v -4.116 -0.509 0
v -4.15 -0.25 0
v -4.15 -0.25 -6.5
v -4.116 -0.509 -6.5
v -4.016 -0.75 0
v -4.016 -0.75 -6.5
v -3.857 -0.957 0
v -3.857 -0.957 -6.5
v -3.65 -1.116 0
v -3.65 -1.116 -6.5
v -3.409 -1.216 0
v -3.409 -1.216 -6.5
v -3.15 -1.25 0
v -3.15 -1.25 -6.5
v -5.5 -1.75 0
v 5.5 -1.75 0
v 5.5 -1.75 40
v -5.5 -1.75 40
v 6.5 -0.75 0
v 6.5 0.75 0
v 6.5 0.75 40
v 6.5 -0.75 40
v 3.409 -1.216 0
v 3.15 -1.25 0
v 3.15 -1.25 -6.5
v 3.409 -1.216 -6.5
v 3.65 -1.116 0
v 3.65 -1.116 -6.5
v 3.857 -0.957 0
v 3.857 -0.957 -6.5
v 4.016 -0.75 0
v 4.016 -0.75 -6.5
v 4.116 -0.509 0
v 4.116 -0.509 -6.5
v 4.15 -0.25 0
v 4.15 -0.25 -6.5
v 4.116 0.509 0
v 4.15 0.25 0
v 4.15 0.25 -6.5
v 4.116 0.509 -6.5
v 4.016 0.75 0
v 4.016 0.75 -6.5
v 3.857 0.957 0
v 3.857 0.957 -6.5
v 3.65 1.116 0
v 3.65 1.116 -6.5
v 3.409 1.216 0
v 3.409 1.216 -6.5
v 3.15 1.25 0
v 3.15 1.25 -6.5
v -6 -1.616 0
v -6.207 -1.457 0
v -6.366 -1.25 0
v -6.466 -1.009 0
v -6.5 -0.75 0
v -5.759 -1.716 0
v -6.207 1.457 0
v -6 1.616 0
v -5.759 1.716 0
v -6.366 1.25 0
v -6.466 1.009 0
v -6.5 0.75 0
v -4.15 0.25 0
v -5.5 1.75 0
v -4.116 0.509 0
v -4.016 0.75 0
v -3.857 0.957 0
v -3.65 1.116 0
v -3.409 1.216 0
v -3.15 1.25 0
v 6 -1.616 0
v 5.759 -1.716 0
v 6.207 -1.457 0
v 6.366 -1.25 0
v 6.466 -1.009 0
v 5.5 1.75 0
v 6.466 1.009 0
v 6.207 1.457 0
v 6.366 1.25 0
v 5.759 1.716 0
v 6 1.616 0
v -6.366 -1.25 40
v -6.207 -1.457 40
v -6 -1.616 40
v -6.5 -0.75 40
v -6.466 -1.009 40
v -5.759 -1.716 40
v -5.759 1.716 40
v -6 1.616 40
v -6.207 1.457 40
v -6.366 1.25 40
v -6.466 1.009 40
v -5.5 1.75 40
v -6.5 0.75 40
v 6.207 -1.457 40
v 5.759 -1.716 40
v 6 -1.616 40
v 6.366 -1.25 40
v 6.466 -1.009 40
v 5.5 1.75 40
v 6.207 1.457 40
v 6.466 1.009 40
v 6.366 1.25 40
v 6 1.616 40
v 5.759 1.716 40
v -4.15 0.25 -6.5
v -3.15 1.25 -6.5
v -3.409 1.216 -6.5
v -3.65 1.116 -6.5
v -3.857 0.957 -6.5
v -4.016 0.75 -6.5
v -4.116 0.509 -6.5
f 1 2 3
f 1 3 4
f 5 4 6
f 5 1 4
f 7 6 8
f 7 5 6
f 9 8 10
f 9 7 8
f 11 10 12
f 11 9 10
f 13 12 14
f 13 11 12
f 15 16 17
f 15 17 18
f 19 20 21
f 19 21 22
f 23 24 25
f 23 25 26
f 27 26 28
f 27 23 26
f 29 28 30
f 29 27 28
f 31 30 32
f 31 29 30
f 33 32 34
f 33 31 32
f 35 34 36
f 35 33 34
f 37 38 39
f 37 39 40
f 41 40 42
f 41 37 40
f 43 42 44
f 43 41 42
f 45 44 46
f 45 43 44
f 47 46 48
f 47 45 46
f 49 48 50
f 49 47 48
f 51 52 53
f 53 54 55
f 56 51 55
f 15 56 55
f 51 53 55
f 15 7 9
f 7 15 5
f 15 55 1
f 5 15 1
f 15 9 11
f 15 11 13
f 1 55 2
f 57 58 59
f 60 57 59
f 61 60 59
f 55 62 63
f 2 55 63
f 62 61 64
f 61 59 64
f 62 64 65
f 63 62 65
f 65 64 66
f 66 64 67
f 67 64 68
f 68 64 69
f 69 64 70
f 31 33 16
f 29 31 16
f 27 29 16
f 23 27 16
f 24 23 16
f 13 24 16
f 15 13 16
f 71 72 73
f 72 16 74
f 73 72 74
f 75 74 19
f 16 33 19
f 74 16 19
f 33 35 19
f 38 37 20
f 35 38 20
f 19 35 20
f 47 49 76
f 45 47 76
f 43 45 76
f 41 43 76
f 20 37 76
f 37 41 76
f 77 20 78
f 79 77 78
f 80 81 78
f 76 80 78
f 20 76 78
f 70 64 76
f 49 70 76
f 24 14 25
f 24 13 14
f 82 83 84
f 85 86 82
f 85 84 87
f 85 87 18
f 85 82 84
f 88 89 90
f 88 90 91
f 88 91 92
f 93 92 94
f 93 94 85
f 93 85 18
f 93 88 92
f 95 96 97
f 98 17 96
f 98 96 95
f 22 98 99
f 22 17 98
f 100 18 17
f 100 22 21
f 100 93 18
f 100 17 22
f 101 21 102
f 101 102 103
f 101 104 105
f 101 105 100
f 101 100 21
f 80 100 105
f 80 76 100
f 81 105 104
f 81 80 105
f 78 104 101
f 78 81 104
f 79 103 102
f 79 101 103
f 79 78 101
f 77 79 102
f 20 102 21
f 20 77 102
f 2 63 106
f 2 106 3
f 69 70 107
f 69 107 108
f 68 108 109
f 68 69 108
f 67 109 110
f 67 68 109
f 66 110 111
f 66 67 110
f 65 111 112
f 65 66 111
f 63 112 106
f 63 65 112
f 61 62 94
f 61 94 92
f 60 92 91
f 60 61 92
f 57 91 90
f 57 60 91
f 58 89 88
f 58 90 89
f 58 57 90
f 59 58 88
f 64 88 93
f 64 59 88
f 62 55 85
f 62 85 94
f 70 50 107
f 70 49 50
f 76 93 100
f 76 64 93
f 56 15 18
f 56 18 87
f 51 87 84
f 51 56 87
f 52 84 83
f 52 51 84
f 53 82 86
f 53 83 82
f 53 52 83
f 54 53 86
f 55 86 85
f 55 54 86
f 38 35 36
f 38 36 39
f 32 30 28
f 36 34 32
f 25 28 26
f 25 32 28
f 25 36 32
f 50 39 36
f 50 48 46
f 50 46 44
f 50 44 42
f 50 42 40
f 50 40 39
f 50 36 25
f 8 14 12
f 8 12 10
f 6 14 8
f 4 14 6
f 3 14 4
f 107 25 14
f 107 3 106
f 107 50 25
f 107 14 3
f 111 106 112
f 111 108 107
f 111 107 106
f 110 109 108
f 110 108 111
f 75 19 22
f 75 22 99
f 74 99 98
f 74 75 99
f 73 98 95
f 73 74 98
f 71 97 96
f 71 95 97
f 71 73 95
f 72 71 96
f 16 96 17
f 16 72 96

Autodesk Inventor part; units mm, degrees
ref_plane "YZ Plane" through (0, 0, 0) normal (1, 0, 0) x (0, 1, 0)
ref_plane "XZ Plane" through (0, 0, 0) normal (0, 1, 0) x (-1, 0, 0)
ref_plane "XY Plane" through (0, 0, 0) normal (0, 0, 1) x (1, 0, 0)
sketch "Sketch1" plane through (0, 0, 0) normal (0, 0, 1) x (1, 0, 0)
  line L0 (-5.5, 1.75) -> (5.5, 1.75)
  line L1 (6.5, 0.75) -> (6.5, -0.75)
  line L2 (5.5, -1.75) -> (-5.5, -1.75)
  line L3 (-6.5, -0.75) -> (-6.5, 0.75)
  line L4 (0, 0) -> (0, 3.6789) construction
  line L5 (0, 0) -> (3.0794, 0) construction
  arc A0 (-5.5, 1.75) -> (-6.5, 0.75) centre (-5.5, 0.75) ccw
  arc A1 (-6.5, -0.75) -> (-5.5, -1.75) centre (-5.5, -0.75) ccw
  arc A2 (5.5, -1.75) -> (6.5, -0.75) centre (5.5, -0.75) ccw
  arc A3 (6.5, 0.75) -> (5.5, 1.75) centre (5.5, 0.75) ccw
  point P0 (-6.5, 1.75)
  point P1 (6.5, -1.75)
  point P2 (6.5, 1.75)
  dimension "d0" = 13
  dimension "d1" = 3.5
  dimension "d2" = 1
  dimension "d3" = 1
extrude "Extrusion1" add sketch "Sketch1" along normal blind 40
sketch "Sketch2" plane through (0, 0, 0) normal (0, 0, -1) x (-1, 0, 0)
  line L0 (-3.15, 1.25) -> (3.15, 1.25)
  line L1 (4.15, 0.25) -> (4.15, -0.25)
  line L2 (3.15, -1.25) -> (-3.15, -1.25)
  line L3 (-4.15, -0.25) -> (-4.15, 0.25)
  line L4 (0, 0) -> (0, 2.3167) construction
  line L5 (0, 0) -> (2.0938, 0) construction
  arc A0 (-3.15, 1.25) -> (-4.15, 0.25) centre (-3.15, 0.25) ccw
  arc A1 (-4.15, -0.25) -> (-3.15, -1.25) centre (-3.15, -0.25) ccw
  arc A2 (3.15, -1.25) -> (4.15, -0.25) centre (3.15, -0.25) ccw
  arc A3 (4.15, 0.25) -> (3.15, 1.25) centre (3.15, 0.25) ccw
  point P0 (4.15, -1.25)
  point P1 (4.15, 1.25)
  point P2 (-4.15, -1.25)
  dimension "d6" = 8.3
  dimension "d7" = 2.5
  dimension "d8" = 1
extrude "Extrusion2" add sketch "Sketch2" along normal blind 6.5
properties part number "3d_JacintoDevKit_Addon - USB Type-C"
